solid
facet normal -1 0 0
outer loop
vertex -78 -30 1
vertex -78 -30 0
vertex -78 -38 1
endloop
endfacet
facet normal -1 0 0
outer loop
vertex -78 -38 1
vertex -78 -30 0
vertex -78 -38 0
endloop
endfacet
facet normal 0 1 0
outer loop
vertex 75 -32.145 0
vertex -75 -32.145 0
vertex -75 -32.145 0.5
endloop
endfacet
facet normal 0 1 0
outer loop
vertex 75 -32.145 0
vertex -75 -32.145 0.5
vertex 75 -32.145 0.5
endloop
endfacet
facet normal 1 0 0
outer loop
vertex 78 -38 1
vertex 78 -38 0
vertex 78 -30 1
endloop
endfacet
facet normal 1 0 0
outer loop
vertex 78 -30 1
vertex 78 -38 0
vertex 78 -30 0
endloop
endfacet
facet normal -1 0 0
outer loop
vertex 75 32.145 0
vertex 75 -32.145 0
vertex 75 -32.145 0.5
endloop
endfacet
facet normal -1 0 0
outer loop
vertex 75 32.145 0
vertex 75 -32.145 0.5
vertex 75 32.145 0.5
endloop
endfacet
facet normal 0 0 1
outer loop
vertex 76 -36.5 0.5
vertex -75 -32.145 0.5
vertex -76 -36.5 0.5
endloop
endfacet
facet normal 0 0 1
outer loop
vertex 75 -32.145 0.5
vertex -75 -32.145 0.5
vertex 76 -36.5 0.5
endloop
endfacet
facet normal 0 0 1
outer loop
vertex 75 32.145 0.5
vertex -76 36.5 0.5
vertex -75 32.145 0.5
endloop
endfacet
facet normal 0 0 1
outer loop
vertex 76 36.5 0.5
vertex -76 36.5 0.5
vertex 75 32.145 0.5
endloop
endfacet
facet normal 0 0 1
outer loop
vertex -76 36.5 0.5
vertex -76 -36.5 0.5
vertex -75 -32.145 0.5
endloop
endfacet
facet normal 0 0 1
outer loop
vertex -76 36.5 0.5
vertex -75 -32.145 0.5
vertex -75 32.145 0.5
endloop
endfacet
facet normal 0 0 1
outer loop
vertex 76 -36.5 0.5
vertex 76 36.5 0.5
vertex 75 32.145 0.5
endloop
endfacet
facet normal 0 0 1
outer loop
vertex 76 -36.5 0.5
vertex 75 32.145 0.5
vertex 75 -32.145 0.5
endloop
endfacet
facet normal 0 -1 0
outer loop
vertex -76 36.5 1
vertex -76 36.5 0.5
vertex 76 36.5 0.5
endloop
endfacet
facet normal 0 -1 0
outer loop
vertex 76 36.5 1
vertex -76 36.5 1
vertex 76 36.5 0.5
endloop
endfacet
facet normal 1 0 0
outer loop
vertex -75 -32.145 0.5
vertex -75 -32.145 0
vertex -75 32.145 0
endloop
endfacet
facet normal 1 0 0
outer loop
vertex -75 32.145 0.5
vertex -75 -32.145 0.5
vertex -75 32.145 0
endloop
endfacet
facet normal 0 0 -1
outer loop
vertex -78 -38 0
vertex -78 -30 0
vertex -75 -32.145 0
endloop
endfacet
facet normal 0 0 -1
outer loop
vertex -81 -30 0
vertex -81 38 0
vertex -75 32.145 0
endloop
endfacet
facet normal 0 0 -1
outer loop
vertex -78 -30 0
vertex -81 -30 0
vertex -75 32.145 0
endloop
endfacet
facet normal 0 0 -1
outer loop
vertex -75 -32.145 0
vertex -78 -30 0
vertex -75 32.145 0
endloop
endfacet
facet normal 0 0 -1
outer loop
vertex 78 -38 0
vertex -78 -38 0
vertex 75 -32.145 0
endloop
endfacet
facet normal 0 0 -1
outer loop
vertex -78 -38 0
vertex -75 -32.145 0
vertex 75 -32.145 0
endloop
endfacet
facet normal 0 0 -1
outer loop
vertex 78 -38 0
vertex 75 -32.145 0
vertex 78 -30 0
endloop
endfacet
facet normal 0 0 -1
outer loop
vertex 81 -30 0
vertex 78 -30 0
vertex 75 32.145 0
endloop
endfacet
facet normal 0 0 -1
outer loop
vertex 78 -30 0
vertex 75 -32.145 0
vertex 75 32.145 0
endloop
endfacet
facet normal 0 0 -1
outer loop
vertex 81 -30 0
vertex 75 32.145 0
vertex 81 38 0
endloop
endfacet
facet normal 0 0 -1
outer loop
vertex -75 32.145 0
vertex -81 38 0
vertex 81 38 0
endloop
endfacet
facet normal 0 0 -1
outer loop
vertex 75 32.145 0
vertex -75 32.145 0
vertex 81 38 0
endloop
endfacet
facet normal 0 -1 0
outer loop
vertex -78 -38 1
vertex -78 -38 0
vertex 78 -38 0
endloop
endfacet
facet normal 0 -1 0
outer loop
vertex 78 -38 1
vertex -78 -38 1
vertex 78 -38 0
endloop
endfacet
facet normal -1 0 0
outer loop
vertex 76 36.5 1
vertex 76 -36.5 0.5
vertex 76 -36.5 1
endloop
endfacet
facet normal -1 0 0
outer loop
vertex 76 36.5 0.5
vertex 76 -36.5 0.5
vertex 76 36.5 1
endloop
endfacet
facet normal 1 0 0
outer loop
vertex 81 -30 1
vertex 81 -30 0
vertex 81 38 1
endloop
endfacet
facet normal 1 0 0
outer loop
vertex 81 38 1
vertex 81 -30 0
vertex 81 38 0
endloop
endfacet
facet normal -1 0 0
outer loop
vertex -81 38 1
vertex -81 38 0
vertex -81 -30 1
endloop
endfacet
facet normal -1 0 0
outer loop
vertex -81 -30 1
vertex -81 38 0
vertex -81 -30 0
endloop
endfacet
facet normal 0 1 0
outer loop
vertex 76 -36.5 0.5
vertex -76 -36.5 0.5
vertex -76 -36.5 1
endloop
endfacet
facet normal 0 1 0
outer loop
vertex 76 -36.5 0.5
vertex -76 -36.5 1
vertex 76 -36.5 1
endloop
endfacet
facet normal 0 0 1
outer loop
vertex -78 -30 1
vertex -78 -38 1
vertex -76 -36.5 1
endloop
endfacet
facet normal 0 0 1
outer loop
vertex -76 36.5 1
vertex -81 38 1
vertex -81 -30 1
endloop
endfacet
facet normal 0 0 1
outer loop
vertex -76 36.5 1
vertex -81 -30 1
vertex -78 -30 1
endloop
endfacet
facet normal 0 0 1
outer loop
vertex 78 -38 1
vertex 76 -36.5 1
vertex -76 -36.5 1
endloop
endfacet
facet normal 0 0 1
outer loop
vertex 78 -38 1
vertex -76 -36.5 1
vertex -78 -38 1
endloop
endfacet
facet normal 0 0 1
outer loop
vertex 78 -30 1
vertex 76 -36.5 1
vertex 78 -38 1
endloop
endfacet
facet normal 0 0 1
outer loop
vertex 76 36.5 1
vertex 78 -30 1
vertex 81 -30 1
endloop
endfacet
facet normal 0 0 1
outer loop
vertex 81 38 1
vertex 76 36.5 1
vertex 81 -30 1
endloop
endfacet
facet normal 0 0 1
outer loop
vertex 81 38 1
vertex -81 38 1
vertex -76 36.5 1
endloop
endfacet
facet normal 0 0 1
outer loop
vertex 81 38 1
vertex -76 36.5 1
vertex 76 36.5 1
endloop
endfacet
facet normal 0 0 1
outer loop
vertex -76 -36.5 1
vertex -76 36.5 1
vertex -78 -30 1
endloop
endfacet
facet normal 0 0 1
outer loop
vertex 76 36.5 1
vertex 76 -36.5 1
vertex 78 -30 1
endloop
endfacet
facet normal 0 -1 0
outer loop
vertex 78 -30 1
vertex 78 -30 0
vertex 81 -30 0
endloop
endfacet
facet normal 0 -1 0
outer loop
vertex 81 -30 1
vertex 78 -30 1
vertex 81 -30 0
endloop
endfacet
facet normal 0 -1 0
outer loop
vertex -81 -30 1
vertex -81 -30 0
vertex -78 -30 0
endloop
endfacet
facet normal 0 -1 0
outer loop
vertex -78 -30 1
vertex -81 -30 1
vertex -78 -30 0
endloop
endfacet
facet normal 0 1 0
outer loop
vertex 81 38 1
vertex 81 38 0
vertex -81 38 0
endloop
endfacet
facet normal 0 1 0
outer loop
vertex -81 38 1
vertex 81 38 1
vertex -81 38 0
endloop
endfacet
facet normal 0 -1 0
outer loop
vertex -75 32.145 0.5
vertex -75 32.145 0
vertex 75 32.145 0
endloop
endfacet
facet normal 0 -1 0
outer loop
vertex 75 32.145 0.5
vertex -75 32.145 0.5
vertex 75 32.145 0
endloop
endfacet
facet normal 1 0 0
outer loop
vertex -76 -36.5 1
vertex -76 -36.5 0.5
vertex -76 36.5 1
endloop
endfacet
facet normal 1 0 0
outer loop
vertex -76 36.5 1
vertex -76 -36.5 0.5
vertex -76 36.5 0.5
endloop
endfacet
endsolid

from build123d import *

# Parameters (mm, degrees)
F0_W     = 152
F0_H     = 73
F1_DEPTH = 1
F0_W_2   = 150
F0_H_2   = 64.29
F2_DEPTH = 0.5


with BuildPart() as f1:
    # F0 (on Top) → F1 (new body)
    with BuildSketch(Plane.XY):
        Polygon((-78, -30), (-78, -38), (78, -38), (78, -30), (81, -30), (81, 38), (-81, 38), (-81, -30), align=None)
        Rectangle(F0_W, F0_H, mode=Mode.SUBTRACT)
    extrude(amount=F1_DEPTH)

    # F0 (on Top) → F2 (join)
    with BuildSketch(Plane.XY):
        Rectangle(F0_W, F0_H)
        Rectangle(F0_W_2, F0_H_2, mode=Mode.SUBTRACT)
    extrude(amount=F2_DEPTH)


solid = f1.part
